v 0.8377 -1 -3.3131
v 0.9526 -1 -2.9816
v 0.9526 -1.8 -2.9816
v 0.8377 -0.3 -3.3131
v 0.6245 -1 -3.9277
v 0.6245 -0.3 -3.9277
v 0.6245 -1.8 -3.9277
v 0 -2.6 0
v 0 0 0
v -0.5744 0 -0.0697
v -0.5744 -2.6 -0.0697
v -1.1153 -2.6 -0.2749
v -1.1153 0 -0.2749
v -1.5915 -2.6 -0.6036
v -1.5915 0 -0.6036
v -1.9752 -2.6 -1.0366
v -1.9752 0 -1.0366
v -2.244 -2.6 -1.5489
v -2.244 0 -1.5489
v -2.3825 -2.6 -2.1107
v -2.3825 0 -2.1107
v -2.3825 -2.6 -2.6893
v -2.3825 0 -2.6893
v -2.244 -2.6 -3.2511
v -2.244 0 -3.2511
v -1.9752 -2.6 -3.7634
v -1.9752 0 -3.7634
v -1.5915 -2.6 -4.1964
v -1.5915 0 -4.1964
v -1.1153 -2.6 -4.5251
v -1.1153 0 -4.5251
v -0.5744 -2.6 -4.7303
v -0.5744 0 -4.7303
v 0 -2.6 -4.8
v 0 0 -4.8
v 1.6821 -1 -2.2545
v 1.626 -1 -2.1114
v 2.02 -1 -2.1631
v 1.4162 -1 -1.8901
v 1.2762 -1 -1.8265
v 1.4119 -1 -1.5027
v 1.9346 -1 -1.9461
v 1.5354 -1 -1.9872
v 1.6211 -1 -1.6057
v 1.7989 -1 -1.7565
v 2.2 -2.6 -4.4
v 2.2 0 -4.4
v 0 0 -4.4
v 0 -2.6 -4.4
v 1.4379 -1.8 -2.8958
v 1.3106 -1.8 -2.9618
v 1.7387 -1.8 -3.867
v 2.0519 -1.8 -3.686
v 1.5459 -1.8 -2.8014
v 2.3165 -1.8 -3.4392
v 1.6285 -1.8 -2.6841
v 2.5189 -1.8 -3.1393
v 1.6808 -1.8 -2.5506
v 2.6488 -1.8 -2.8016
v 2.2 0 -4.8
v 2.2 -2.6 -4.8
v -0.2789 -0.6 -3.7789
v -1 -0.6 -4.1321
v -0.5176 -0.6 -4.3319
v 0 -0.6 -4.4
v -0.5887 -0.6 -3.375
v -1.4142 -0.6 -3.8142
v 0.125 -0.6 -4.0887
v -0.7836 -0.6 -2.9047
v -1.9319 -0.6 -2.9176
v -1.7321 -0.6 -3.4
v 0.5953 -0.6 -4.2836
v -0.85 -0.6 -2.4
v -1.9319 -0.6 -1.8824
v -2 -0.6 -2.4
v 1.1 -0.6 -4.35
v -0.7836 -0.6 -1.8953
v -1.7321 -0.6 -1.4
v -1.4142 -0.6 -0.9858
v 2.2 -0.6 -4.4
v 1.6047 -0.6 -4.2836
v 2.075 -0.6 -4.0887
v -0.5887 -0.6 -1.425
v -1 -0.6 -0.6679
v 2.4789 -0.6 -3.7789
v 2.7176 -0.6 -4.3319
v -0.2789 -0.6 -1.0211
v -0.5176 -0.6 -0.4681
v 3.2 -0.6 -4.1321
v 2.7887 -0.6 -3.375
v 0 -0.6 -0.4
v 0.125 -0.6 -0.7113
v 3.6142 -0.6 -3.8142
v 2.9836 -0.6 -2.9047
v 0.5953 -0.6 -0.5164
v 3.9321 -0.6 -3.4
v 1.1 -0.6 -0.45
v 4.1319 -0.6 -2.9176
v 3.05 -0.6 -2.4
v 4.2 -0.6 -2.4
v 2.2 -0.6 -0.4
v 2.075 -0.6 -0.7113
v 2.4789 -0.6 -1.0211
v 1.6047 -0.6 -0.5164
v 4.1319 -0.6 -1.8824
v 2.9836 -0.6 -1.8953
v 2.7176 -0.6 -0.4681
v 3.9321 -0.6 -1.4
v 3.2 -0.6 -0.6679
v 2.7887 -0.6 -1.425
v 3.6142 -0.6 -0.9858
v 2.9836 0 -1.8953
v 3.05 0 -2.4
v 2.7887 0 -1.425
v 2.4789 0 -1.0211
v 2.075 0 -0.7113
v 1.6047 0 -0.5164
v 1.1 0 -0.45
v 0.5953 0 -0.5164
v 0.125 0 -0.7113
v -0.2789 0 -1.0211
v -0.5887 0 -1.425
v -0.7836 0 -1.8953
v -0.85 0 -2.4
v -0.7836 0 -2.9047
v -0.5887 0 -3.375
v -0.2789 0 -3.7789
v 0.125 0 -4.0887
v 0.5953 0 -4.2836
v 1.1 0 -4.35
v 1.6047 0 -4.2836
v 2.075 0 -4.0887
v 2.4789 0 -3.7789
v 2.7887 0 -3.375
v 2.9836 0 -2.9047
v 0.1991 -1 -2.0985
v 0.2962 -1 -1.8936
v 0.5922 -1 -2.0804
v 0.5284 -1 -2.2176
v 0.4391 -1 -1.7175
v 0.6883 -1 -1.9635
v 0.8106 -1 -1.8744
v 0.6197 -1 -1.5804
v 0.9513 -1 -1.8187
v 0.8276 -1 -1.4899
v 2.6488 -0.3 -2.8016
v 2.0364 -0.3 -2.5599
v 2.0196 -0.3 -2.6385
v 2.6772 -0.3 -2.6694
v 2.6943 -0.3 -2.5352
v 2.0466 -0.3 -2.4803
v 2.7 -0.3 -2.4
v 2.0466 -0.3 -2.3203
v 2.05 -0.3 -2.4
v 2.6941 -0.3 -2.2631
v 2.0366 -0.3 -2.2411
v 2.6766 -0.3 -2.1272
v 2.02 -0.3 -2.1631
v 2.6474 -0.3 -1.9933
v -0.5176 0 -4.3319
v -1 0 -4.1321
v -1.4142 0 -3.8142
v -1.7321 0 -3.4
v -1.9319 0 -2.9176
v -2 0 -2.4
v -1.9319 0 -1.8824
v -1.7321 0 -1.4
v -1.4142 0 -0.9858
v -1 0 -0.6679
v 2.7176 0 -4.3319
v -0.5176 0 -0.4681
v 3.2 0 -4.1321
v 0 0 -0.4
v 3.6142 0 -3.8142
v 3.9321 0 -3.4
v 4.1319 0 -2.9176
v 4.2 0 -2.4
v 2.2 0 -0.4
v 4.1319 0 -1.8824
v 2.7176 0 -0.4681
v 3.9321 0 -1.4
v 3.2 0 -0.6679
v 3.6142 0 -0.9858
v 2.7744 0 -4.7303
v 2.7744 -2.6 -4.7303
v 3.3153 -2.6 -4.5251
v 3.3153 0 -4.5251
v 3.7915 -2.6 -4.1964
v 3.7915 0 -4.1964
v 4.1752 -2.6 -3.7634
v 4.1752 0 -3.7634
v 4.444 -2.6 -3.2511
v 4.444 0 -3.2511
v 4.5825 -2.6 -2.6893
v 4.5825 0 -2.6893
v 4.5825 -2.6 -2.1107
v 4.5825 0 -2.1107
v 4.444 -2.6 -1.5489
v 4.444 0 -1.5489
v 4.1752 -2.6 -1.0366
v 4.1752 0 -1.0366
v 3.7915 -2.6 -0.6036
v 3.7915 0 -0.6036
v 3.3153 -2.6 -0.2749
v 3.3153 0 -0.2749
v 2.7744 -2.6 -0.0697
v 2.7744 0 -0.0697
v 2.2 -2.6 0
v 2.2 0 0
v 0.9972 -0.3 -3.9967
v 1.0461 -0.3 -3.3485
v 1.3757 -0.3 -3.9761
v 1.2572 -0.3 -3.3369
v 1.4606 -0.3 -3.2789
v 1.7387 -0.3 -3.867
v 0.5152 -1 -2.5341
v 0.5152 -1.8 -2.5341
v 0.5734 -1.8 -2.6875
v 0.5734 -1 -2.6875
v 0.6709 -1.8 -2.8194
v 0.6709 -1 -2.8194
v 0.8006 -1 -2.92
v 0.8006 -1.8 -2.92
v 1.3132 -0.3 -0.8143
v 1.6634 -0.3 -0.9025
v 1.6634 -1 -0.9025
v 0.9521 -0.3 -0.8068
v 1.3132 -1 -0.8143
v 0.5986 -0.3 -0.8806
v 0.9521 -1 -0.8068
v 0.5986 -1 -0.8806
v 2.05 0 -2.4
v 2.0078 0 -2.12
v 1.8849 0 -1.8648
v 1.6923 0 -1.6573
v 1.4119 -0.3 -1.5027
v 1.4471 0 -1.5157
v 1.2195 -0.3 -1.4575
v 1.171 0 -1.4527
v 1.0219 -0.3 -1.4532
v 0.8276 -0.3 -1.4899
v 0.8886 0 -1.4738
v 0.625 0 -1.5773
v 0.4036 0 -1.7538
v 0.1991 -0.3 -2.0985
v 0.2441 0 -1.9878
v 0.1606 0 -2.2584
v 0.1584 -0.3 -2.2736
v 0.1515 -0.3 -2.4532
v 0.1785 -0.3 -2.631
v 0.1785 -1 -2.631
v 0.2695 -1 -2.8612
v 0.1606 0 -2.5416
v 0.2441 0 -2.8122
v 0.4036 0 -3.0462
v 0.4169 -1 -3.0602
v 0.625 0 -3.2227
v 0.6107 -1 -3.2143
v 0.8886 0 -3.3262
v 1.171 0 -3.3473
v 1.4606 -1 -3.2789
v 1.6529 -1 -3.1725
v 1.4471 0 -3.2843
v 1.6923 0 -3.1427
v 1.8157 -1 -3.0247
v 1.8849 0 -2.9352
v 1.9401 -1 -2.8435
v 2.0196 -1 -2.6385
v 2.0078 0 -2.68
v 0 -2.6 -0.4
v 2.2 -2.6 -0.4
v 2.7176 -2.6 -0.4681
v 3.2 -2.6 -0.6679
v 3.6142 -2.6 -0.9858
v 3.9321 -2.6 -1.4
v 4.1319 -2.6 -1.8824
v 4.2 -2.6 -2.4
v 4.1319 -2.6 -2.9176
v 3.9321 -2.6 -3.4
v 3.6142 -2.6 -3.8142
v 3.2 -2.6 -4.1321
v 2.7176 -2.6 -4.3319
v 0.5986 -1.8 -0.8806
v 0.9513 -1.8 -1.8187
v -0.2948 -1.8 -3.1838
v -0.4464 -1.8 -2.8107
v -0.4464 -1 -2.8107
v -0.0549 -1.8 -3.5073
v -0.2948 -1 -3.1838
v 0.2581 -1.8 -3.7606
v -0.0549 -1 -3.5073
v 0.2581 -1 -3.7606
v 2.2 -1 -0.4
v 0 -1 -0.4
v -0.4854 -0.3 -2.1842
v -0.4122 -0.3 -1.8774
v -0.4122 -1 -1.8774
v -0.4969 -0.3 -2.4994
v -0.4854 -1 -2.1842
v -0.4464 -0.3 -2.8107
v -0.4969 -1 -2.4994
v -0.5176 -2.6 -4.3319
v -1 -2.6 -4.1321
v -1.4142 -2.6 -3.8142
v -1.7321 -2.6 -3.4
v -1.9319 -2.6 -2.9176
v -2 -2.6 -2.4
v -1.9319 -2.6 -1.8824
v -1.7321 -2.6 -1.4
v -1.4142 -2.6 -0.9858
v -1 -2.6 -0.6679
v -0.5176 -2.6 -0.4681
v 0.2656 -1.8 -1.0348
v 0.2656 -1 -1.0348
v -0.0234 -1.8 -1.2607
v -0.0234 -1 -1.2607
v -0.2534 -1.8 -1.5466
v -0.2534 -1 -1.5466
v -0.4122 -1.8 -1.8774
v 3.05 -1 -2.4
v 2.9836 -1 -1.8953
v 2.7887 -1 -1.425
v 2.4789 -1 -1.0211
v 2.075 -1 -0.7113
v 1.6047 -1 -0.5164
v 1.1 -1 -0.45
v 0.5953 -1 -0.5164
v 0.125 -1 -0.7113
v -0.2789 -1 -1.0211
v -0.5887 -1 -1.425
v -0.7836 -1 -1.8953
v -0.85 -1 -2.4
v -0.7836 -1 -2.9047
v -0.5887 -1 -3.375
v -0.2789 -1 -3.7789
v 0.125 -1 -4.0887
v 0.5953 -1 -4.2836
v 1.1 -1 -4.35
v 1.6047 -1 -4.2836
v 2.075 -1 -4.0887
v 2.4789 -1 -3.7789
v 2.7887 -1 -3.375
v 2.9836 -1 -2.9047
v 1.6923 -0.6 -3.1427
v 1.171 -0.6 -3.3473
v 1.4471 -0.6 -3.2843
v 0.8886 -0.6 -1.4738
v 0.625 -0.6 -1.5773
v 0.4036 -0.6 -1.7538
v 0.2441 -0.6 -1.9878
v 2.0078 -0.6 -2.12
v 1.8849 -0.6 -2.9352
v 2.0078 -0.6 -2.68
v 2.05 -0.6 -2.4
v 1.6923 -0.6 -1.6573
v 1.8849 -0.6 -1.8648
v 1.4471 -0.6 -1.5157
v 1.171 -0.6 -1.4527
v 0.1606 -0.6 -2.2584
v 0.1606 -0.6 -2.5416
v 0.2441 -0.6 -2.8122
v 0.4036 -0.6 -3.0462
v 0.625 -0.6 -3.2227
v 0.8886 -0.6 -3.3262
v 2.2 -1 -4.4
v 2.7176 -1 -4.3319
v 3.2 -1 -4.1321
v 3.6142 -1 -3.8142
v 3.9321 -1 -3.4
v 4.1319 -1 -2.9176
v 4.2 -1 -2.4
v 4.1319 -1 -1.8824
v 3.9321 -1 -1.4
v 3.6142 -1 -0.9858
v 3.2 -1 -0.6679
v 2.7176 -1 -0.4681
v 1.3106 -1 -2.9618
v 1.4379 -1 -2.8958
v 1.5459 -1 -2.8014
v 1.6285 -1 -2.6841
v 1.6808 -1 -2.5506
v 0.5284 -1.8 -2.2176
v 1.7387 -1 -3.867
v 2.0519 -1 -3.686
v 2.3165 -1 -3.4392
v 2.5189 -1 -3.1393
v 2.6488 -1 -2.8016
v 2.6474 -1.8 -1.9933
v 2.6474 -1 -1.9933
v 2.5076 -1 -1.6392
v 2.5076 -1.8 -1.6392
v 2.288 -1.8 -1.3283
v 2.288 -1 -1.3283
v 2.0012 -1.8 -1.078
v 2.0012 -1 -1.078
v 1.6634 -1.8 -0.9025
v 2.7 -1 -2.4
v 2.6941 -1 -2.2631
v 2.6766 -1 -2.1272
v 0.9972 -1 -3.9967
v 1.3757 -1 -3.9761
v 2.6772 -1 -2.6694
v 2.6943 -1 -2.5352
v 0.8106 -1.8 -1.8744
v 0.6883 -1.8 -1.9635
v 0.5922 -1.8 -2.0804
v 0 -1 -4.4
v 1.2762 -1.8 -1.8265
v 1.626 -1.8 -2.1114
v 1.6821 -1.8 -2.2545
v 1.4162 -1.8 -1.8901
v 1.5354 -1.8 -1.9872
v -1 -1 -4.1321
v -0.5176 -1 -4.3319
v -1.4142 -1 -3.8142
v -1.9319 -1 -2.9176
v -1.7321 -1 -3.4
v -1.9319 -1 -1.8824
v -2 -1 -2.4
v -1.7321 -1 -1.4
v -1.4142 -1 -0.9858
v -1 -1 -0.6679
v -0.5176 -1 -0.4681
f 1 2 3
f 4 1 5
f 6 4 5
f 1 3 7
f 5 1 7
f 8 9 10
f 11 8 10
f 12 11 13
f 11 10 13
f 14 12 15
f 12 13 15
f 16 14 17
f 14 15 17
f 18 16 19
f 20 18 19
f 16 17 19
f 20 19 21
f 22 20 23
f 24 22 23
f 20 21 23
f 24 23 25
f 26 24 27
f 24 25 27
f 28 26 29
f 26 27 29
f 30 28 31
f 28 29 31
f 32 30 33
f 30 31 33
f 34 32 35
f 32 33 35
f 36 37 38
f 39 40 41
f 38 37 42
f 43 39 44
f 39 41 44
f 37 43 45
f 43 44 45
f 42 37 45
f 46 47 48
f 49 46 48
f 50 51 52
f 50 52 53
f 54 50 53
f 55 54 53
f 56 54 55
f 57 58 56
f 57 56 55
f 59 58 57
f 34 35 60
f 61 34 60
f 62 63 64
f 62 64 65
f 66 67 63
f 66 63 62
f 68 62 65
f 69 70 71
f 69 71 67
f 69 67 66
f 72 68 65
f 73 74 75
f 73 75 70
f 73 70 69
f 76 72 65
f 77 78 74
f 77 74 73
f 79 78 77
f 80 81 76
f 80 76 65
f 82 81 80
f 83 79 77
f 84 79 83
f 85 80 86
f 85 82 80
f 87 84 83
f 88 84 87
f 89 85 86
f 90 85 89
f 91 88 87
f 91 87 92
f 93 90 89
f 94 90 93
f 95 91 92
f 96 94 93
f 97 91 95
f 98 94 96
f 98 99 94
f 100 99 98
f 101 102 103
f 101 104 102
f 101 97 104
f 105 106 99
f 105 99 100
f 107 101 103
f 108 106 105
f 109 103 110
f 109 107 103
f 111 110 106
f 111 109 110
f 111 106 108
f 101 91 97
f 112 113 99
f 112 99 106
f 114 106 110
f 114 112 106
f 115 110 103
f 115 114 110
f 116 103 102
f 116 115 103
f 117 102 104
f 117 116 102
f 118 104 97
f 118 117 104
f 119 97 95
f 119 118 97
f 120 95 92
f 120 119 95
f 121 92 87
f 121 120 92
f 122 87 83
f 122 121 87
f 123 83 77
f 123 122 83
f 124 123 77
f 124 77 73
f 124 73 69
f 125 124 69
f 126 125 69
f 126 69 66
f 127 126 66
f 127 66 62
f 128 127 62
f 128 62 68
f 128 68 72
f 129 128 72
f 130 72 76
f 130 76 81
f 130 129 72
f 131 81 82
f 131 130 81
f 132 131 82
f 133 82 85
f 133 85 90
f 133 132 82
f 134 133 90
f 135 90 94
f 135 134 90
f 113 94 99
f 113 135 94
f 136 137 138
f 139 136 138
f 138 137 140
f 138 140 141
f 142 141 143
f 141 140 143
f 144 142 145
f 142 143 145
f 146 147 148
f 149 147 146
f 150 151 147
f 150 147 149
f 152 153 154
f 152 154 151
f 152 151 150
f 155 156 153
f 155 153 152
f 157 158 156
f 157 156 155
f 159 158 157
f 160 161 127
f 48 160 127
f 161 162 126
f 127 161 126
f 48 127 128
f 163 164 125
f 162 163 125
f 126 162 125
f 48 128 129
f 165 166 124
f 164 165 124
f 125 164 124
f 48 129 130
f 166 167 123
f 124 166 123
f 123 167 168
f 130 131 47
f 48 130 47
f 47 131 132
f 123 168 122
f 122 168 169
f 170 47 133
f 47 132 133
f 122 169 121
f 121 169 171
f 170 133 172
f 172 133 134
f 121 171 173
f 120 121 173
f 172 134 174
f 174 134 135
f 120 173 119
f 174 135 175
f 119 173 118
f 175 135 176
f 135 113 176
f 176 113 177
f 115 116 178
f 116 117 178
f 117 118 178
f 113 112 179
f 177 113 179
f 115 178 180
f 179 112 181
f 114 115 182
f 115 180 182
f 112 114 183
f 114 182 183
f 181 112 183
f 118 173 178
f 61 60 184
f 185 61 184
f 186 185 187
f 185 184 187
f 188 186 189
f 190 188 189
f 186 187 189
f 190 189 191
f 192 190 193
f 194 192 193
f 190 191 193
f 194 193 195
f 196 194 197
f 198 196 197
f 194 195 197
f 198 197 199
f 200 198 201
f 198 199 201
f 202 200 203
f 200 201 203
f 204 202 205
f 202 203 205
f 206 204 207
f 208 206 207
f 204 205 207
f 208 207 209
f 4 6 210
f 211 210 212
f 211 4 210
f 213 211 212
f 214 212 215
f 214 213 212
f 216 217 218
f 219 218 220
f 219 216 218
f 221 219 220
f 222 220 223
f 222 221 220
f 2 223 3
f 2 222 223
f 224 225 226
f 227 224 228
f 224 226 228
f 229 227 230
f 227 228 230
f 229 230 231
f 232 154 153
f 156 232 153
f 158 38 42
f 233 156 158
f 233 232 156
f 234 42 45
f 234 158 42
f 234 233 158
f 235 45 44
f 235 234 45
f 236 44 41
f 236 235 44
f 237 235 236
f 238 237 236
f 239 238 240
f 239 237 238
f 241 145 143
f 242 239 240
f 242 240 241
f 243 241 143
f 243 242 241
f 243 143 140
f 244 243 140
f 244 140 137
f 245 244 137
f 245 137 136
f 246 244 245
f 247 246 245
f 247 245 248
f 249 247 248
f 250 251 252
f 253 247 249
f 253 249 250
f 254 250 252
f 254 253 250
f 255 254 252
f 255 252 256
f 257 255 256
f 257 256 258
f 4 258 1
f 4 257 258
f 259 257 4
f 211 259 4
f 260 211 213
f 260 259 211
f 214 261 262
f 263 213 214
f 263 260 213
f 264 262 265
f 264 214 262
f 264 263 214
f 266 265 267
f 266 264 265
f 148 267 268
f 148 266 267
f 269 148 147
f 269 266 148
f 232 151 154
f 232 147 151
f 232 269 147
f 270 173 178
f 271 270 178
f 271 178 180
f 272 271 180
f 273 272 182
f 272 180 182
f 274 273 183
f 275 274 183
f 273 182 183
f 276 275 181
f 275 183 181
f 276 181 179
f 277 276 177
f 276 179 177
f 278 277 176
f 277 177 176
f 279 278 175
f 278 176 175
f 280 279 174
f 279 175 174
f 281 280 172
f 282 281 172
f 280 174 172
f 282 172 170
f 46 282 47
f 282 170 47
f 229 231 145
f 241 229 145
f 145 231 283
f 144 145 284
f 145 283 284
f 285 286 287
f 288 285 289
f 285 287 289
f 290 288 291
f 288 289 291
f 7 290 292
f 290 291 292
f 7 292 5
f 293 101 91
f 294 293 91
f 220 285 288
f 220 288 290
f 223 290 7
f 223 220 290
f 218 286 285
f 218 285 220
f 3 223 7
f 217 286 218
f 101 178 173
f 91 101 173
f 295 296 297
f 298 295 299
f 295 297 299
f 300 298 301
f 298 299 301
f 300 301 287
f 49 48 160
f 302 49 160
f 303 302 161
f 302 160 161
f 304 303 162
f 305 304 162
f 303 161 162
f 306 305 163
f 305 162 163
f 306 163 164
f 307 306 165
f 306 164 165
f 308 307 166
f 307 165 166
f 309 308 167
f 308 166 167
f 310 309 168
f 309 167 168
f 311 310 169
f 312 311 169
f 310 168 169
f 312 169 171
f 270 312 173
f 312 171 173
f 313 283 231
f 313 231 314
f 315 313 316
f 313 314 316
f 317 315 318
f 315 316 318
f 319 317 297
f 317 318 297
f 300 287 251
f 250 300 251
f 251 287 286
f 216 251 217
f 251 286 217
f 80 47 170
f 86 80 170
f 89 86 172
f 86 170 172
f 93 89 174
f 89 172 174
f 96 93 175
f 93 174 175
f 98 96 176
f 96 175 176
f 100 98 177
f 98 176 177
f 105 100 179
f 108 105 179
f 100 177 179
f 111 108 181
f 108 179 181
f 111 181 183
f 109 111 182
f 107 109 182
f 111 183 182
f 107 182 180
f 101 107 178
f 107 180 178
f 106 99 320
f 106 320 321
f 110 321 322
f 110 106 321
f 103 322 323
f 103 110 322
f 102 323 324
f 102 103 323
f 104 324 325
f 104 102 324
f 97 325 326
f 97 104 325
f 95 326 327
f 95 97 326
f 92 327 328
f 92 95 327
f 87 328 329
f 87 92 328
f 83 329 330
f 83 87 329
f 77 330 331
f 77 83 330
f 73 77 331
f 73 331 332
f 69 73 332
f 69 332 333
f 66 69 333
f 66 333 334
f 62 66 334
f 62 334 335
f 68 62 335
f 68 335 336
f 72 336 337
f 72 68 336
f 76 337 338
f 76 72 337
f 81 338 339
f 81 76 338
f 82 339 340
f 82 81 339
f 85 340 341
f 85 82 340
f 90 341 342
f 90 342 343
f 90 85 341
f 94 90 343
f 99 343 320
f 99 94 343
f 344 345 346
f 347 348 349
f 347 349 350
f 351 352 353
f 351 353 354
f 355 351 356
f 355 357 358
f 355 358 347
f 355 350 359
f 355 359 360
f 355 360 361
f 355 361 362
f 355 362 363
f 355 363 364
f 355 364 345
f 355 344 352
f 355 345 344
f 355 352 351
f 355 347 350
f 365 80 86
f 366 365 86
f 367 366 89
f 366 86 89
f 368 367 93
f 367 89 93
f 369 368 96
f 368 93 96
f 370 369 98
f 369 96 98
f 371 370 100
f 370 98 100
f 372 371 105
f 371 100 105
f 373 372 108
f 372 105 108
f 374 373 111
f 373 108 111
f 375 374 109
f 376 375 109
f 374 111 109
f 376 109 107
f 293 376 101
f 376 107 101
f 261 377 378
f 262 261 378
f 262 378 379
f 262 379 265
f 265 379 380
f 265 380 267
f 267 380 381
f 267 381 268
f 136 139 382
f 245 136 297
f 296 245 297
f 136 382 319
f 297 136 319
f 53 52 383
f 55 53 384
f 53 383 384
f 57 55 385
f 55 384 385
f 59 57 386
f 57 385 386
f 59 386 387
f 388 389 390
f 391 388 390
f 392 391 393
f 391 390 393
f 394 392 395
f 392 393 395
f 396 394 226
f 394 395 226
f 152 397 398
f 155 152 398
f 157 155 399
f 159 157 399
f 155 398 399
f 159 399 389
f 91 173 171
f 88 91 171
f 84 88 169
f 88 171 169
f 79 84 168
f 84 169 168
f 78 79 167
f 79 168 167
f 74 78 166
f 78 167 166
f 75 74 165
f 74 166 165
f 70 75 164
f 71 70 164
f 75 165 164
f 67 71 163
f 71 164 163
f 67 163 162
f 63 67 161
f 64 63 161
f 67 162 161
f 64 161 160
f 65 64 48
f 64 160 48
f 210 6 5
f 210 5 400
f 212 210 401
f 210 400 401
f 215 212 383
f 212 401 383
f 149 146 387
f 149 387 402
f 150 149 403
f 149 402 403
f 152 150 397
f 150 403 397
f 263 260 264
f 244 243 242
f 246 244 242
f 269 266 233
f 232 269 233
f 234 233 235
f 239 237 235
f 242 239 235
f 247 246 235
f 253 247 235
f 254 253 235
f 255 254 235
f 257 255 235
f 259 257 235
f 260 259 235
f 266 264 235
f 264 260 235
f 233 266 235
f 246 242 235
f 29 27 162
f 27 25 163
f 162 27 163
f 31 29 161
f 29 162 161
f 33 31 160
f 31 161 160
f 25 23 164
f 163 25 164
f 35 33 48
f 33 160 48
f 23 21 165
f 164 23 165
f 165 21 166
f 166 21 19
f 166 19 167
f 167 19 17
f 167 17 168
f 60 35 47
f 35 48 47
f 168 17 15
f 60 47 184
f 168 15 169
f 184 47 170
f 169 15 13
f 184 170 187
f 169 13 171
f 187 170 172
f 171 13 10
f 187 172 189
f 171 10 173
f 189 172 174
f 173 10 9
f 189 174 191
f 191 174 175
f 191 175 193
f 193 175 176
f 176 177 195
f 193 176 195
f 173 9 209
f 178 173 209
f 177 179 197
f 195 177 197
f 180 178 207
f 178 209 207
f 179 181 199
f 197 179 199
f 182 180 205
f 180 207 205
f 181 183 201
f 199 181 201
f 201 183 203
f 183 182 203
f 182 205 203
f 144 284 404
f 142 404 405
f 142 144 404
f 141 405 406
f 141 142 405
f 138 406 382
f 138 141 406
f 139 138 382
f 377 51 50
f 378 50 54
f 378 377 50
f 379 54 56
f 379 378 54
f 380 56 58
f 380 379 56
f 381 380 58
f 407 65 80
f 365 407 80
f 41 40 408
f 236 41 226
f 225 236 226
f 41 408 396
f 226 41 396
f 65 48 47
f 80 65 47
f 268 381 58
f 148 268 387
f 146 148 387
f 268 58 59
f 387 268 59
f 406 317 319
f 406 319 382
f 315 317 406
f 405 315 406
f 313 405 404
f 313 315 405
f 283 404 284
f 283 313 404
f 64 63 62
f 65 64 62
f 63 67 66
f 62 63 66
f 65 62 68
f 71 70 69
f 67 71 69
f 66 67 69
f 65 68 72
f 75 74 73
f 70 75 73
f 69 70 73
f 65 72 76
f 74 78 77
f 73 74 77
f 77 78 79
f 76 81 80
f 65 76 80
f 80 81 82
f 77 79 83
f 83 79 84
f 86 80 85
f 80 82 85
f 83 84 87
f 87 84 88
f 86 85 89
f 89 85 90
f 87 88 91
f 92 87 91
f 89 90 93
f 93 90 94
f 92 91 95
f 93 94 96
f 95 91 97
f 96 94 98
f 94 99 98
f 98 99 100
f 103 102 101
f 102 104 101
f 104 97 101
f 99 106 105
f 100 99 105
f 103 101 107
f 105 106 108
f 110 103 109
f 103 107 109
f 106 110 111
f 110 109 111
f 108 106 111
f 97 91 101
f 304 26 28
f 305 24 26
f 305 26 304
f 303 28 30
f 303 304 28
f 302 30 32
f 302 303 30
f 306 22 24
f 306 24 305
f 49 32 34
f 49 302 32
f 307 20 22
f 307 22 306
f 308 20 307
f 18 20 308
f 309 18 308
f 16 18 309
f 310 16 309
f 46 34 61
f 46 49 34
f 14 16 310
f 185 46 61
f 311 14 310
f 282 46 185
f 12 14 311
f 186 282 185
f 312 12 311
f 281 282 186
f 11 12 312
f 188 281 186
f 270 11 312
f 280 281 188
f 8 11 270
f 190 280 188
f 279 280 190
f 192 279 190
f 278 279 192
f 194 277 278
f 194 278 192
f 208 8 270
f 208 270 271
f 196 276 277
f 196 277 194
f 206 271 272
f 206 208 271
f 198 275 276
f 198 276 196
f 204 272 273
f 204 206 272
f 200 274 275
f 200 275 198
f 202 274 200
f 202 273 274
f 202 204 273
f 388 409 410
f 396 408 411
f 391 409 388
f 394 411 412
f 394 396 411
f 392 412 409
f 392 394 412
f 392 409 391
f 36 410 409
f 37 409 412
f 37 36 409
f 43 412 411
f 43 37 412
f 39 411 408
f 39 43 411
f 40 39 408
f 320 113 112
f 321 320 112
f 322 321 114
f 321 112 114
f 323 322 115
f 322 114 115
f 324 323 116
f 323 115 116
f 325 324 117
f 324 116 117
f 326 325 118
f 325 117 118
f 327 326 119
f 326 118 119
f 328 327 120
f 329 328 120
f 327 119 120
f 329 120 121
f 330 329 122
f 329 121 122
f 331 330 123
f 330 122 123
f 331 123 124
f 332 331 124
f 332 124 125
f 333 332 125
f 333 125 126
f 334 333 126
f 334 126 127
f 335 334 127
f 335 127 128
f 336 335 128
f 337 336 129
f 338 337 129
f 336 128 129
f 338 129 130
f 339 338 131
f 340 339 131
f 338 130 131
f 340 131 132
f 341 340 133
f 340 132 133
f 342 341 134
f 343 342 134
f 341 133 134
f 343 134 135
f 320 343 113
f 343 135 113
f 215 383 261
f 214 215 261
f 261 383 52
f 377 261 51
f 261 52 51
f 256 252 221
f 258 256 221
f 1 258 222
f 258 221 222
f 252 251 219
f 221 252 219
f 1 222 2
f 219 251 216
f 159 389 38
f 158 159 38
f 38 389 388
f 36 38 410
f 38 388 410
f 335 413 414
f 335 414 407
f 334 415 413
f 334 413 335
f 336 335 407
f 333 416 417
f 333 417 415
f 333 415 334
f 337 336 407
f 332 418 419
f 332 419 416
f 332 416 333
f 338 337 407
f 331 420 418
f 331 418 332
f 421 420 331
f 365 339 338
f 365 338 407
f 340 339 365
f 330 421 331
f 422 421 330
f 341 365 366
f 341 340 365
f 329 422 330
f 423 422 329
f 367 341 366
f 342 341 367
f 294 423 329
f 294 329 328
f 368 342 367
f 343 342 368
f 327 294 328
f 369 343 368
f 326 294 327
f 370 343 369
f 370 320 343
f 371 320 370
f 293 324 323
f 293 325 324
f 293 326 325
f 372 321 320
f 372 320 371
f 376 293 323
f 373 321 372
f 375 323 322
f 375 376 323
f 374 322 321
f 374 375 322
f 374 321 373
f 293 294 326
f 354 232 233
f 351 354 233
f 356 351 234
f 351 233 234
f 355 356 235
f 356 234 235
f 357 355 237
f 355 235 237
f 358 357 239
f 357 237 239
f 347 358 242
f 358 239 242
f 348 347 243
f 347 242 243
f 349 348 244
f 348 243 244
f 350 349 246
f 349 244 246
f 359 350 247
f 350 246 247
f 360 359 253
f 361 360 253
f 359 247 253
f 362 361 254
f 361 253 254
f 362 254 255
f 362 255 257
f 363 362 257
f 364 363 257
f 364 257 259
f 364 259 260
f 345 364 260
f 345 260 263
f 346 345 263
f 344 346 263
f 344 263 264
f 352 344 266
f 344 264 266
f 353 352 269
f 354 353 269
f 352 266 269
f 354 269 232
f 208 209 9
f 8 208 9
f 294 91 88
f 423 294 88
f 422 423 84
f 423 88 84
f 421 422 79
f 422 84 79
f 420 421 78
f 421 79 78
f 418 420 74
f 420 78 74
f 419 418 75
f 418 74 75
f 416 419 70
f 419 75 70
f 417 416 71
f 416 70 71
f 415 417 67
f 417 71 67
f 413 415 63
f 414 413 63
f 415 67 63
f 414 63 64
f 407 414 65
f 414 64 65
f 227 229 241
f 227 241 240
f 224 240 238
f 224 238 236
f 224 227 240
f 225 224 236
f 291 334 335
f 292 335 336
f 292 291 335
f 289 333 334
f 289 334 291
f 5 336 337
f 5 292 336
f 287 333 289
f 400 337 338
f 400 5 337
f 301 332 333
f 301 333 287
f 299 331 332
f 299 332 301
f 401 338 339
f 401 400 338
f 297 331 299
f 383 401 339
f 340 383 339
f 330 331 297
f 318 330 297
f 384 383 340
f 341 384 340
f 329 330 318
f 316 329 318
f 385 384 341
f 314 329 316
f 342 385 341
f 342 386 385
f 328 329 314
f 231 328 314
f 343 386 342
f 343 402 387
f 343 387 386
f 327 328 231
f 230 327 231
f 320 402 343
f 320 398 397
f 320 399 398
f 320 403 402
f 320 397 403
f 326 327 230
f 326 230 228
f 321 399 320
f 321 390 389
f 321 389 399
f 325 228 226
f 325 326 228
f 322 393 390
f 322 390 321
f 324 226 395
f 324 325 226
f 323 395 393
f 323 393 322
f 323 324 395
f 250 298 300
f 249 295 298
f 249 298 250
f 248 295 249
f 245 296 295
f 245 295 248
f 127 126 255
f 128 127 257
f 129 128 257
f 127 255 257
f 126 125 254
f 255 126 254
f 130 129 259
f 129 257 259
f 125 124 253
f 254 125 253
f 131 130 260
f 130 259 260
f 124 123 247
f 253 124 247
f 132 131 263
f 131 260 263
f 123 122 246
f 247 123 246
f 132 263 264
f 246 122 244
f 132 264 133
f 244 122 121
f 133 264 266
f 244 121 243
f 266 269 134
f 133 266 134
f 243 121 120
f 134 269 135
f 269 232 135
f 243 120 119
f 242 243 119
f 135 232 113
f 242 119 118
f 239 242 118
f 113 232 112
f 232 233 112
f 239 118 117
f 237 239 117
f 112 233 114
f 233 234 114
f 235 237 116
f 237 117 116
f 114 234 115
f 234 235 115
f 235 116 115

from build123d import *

# Parameters (mm, degrees)
F1_DEPTH = 2.6
F0_R     = 1.95
F0_R_2   = 0.95
F2_DEPTH = 1
F3_DEPTH = 0.6
F5_DEPTH = 0.4
F4_R     = 1.6
F4_R_2   = 0.95
F4_R_3   = 0.6
F6_DEPTH = 0.8
F8_DEPTH = 1.5
F9_DEPTH = 1.5


with BuildPart() as f1:
    # F0 (on Front) → F1 (new body)
    with BuildSketch(Plane.XZ):
        with BuildLine():
            Line((2.2, 0), (0, 0))
            ThreePointArc((0, 0), (-2.4, -2.4), (0, -4.8))
            Line((0, -4.8), (2.2, -4.8))
            ThreePointArc((2.2, -4.8), (4.6, -2.4), (2.2, 0))
        make_face()
        with BuildLine():
            Line((2.2, -4.4), (0, -4.4))
            ThreePointArc((0, -4.4), (-2, -2.4), (0, -0.4))
            Line((0, -0.4), (2.2, -0.4))
            ThreePointArc((2.2, -0.4), (4.2, -2.4), (2.2, -4.4))
        make_face(mode=Mode.SUBTRACT)
    extrude(amount=F1_DEPTH)


with BuildPart() as f2:
    # F0 (on Front) → F2 (new body)
    with BuildSketch(Plane.XZ):
        with Locations((1.1, -2.4)):
            Circle(F0_R)
        with Locations((1.1, -2.4)):
            Circle(F0_R_2, mode=Mode.SUBTRACT)
    extrude(amount=F2_DEPTH)

    # F4 (on face) → F6 (join)
    with BuildSketch(Plane.XZ.offset(1)):
        with Locations((1.1, -2.4)):
            Circle(F4_R)
        with Locations((1.1, -2.4)):
            Circle(F4_R_2, mode=Mode.SUBTRACT)
        with Locations((1.1, -2.4)):
            Circle(F4_R_2)
        with Locations((1.1, -2.4)):
            Circle(F4_R_3, mode=Mode.SUBTRACT)
    extrude(amount=F6_DEPTH)

    # F7 (on face) → F8 (cut)
    with BuildSketch(Plane.XZ.offset(1.8)):
        with BuildLine():
            ThreePointArc((0.9512789374, -1.8187237786), (1.1142826352, -1.8001700188), (1.2762185296, -1.8264609605))
            Line((1.2762185296, -1.8264609605), (1.663423831, -0.9024841949))
            ThreePointArc((1.663423831, -0.9024841949), (1.1328728178, -0.8003377301), (0.5985732983, -0.8806016774))
            Line((0.5985732983, -0.8806016774), (0.9512789374, -1.8187237786))
        make_face()
        with BuildLine():
            Line((1.738665985, -3.8670057122), (1.3106189327, -2.961818178))
            ThreePointArc((1.3106189327, -2.961818178), (1.133144808, -2.9990838186), (0.9526429242, -2.9816234969))
            Line((0.9526429242, -2.9816234969), (0.6245447307, -3.9277245455))
            ThreePointArc((0.6245447307, -3.9277245455), (1.1870696767, -3.9976291408), (1.738665985, -3.8670057122))
        make_face()
    extrude(amount=-F8_DEPTH, mode=Mode.SUBTRACT)

    # F7 (on face) → F9 (cut)
    with BuildSketch(Plane.XZ.offset(1.8)):
        with BuildLine():
            ThreePointArc((0.5151749967, -2.5340884617), (0.5005219017, -2.3749798148), (0.5283822526, -2.2176455352))
            Line((0.5283822526, -2.2176455352), (-0.4122298327, -1.8773519989))
            ThreePointArc((-0.4122298327, -1.8773519989), (-0.4989300226, -2.3414954455), (-0.4463821063, -2.8107339546))
            Line((-0.4463821063, -2.8107339546), (0.5151749967, -2.5340884617))
        make_face()
        with BuildLine():
            Line((2.6474359222, -1.9932542973), (1.682096615, -2.2545230917))
            ThreePointArc((1.682096615, -2.2545230917), (1.6955073337, -2.3267127875), (1.7, -2.4))
            ThreePointArc((1.7, -2.4), (1.6951779147, -2.4759160708), (1.6807891673, -2.5506118956))
            Line((1.6807891673, -2.5506118956), (2.6487711129, -2.8016317217))
            ThreePointArc((2.6487711129, -2.8016317217), (2.687141106, -2.6024428554), (2.7, -2.4))
            ThreePointArc((2.7, -2.4), (2.6868045682, -2.1949359558), (2.6474359222, -1.9932542973))
        make_face()
    extrude(amount=-F9_DEPTH, mode=Mode.SUBTRACT)


with BuildPart() as f3:
    # F0 (on Front) → F3 (new body)
    with BuildSketch(Plane.XZ):
        with BuildLine():
            ThreePointArc((0, -0.4), (-2, -2.4), (0, -4.4))
            Line((0, -4.4), (2.2, -4.4))
            ThreePointArc((2.2, -4.4), (4.2, -2.4), (2.2, -0.4))
            Line((2.2, -0.4), (0, -0.4))
        make_face()
        with Locations((1.1, -2.4)):
            Circle(F0_R, mode=Mode.SUBTRACT)
    extrude(amount=F3_DEPTH)


with BuildPart() as f3b:
    # F0 (on Front) → F3, piece 2 (new body)
    with BuildSketch(Plane.XZ):
        with Locations((1.1, -2.4)):
            Circle(F0_R_2)
    extrude(amount=F3_DEPTH)


with BuildPart() as f5:
    # F5 (new): a face of the model
    f5_faces = [f3.part.faces().sort_by_distance(p)[0] for p in [
        (1.1, -0.6, -4.3926216533),
    ]]
    extrude(f5_faces, amount=F5_DEPTH)


solid = Compound([f1.part, f2.part, f3.part, f3b.part, f5.part])
